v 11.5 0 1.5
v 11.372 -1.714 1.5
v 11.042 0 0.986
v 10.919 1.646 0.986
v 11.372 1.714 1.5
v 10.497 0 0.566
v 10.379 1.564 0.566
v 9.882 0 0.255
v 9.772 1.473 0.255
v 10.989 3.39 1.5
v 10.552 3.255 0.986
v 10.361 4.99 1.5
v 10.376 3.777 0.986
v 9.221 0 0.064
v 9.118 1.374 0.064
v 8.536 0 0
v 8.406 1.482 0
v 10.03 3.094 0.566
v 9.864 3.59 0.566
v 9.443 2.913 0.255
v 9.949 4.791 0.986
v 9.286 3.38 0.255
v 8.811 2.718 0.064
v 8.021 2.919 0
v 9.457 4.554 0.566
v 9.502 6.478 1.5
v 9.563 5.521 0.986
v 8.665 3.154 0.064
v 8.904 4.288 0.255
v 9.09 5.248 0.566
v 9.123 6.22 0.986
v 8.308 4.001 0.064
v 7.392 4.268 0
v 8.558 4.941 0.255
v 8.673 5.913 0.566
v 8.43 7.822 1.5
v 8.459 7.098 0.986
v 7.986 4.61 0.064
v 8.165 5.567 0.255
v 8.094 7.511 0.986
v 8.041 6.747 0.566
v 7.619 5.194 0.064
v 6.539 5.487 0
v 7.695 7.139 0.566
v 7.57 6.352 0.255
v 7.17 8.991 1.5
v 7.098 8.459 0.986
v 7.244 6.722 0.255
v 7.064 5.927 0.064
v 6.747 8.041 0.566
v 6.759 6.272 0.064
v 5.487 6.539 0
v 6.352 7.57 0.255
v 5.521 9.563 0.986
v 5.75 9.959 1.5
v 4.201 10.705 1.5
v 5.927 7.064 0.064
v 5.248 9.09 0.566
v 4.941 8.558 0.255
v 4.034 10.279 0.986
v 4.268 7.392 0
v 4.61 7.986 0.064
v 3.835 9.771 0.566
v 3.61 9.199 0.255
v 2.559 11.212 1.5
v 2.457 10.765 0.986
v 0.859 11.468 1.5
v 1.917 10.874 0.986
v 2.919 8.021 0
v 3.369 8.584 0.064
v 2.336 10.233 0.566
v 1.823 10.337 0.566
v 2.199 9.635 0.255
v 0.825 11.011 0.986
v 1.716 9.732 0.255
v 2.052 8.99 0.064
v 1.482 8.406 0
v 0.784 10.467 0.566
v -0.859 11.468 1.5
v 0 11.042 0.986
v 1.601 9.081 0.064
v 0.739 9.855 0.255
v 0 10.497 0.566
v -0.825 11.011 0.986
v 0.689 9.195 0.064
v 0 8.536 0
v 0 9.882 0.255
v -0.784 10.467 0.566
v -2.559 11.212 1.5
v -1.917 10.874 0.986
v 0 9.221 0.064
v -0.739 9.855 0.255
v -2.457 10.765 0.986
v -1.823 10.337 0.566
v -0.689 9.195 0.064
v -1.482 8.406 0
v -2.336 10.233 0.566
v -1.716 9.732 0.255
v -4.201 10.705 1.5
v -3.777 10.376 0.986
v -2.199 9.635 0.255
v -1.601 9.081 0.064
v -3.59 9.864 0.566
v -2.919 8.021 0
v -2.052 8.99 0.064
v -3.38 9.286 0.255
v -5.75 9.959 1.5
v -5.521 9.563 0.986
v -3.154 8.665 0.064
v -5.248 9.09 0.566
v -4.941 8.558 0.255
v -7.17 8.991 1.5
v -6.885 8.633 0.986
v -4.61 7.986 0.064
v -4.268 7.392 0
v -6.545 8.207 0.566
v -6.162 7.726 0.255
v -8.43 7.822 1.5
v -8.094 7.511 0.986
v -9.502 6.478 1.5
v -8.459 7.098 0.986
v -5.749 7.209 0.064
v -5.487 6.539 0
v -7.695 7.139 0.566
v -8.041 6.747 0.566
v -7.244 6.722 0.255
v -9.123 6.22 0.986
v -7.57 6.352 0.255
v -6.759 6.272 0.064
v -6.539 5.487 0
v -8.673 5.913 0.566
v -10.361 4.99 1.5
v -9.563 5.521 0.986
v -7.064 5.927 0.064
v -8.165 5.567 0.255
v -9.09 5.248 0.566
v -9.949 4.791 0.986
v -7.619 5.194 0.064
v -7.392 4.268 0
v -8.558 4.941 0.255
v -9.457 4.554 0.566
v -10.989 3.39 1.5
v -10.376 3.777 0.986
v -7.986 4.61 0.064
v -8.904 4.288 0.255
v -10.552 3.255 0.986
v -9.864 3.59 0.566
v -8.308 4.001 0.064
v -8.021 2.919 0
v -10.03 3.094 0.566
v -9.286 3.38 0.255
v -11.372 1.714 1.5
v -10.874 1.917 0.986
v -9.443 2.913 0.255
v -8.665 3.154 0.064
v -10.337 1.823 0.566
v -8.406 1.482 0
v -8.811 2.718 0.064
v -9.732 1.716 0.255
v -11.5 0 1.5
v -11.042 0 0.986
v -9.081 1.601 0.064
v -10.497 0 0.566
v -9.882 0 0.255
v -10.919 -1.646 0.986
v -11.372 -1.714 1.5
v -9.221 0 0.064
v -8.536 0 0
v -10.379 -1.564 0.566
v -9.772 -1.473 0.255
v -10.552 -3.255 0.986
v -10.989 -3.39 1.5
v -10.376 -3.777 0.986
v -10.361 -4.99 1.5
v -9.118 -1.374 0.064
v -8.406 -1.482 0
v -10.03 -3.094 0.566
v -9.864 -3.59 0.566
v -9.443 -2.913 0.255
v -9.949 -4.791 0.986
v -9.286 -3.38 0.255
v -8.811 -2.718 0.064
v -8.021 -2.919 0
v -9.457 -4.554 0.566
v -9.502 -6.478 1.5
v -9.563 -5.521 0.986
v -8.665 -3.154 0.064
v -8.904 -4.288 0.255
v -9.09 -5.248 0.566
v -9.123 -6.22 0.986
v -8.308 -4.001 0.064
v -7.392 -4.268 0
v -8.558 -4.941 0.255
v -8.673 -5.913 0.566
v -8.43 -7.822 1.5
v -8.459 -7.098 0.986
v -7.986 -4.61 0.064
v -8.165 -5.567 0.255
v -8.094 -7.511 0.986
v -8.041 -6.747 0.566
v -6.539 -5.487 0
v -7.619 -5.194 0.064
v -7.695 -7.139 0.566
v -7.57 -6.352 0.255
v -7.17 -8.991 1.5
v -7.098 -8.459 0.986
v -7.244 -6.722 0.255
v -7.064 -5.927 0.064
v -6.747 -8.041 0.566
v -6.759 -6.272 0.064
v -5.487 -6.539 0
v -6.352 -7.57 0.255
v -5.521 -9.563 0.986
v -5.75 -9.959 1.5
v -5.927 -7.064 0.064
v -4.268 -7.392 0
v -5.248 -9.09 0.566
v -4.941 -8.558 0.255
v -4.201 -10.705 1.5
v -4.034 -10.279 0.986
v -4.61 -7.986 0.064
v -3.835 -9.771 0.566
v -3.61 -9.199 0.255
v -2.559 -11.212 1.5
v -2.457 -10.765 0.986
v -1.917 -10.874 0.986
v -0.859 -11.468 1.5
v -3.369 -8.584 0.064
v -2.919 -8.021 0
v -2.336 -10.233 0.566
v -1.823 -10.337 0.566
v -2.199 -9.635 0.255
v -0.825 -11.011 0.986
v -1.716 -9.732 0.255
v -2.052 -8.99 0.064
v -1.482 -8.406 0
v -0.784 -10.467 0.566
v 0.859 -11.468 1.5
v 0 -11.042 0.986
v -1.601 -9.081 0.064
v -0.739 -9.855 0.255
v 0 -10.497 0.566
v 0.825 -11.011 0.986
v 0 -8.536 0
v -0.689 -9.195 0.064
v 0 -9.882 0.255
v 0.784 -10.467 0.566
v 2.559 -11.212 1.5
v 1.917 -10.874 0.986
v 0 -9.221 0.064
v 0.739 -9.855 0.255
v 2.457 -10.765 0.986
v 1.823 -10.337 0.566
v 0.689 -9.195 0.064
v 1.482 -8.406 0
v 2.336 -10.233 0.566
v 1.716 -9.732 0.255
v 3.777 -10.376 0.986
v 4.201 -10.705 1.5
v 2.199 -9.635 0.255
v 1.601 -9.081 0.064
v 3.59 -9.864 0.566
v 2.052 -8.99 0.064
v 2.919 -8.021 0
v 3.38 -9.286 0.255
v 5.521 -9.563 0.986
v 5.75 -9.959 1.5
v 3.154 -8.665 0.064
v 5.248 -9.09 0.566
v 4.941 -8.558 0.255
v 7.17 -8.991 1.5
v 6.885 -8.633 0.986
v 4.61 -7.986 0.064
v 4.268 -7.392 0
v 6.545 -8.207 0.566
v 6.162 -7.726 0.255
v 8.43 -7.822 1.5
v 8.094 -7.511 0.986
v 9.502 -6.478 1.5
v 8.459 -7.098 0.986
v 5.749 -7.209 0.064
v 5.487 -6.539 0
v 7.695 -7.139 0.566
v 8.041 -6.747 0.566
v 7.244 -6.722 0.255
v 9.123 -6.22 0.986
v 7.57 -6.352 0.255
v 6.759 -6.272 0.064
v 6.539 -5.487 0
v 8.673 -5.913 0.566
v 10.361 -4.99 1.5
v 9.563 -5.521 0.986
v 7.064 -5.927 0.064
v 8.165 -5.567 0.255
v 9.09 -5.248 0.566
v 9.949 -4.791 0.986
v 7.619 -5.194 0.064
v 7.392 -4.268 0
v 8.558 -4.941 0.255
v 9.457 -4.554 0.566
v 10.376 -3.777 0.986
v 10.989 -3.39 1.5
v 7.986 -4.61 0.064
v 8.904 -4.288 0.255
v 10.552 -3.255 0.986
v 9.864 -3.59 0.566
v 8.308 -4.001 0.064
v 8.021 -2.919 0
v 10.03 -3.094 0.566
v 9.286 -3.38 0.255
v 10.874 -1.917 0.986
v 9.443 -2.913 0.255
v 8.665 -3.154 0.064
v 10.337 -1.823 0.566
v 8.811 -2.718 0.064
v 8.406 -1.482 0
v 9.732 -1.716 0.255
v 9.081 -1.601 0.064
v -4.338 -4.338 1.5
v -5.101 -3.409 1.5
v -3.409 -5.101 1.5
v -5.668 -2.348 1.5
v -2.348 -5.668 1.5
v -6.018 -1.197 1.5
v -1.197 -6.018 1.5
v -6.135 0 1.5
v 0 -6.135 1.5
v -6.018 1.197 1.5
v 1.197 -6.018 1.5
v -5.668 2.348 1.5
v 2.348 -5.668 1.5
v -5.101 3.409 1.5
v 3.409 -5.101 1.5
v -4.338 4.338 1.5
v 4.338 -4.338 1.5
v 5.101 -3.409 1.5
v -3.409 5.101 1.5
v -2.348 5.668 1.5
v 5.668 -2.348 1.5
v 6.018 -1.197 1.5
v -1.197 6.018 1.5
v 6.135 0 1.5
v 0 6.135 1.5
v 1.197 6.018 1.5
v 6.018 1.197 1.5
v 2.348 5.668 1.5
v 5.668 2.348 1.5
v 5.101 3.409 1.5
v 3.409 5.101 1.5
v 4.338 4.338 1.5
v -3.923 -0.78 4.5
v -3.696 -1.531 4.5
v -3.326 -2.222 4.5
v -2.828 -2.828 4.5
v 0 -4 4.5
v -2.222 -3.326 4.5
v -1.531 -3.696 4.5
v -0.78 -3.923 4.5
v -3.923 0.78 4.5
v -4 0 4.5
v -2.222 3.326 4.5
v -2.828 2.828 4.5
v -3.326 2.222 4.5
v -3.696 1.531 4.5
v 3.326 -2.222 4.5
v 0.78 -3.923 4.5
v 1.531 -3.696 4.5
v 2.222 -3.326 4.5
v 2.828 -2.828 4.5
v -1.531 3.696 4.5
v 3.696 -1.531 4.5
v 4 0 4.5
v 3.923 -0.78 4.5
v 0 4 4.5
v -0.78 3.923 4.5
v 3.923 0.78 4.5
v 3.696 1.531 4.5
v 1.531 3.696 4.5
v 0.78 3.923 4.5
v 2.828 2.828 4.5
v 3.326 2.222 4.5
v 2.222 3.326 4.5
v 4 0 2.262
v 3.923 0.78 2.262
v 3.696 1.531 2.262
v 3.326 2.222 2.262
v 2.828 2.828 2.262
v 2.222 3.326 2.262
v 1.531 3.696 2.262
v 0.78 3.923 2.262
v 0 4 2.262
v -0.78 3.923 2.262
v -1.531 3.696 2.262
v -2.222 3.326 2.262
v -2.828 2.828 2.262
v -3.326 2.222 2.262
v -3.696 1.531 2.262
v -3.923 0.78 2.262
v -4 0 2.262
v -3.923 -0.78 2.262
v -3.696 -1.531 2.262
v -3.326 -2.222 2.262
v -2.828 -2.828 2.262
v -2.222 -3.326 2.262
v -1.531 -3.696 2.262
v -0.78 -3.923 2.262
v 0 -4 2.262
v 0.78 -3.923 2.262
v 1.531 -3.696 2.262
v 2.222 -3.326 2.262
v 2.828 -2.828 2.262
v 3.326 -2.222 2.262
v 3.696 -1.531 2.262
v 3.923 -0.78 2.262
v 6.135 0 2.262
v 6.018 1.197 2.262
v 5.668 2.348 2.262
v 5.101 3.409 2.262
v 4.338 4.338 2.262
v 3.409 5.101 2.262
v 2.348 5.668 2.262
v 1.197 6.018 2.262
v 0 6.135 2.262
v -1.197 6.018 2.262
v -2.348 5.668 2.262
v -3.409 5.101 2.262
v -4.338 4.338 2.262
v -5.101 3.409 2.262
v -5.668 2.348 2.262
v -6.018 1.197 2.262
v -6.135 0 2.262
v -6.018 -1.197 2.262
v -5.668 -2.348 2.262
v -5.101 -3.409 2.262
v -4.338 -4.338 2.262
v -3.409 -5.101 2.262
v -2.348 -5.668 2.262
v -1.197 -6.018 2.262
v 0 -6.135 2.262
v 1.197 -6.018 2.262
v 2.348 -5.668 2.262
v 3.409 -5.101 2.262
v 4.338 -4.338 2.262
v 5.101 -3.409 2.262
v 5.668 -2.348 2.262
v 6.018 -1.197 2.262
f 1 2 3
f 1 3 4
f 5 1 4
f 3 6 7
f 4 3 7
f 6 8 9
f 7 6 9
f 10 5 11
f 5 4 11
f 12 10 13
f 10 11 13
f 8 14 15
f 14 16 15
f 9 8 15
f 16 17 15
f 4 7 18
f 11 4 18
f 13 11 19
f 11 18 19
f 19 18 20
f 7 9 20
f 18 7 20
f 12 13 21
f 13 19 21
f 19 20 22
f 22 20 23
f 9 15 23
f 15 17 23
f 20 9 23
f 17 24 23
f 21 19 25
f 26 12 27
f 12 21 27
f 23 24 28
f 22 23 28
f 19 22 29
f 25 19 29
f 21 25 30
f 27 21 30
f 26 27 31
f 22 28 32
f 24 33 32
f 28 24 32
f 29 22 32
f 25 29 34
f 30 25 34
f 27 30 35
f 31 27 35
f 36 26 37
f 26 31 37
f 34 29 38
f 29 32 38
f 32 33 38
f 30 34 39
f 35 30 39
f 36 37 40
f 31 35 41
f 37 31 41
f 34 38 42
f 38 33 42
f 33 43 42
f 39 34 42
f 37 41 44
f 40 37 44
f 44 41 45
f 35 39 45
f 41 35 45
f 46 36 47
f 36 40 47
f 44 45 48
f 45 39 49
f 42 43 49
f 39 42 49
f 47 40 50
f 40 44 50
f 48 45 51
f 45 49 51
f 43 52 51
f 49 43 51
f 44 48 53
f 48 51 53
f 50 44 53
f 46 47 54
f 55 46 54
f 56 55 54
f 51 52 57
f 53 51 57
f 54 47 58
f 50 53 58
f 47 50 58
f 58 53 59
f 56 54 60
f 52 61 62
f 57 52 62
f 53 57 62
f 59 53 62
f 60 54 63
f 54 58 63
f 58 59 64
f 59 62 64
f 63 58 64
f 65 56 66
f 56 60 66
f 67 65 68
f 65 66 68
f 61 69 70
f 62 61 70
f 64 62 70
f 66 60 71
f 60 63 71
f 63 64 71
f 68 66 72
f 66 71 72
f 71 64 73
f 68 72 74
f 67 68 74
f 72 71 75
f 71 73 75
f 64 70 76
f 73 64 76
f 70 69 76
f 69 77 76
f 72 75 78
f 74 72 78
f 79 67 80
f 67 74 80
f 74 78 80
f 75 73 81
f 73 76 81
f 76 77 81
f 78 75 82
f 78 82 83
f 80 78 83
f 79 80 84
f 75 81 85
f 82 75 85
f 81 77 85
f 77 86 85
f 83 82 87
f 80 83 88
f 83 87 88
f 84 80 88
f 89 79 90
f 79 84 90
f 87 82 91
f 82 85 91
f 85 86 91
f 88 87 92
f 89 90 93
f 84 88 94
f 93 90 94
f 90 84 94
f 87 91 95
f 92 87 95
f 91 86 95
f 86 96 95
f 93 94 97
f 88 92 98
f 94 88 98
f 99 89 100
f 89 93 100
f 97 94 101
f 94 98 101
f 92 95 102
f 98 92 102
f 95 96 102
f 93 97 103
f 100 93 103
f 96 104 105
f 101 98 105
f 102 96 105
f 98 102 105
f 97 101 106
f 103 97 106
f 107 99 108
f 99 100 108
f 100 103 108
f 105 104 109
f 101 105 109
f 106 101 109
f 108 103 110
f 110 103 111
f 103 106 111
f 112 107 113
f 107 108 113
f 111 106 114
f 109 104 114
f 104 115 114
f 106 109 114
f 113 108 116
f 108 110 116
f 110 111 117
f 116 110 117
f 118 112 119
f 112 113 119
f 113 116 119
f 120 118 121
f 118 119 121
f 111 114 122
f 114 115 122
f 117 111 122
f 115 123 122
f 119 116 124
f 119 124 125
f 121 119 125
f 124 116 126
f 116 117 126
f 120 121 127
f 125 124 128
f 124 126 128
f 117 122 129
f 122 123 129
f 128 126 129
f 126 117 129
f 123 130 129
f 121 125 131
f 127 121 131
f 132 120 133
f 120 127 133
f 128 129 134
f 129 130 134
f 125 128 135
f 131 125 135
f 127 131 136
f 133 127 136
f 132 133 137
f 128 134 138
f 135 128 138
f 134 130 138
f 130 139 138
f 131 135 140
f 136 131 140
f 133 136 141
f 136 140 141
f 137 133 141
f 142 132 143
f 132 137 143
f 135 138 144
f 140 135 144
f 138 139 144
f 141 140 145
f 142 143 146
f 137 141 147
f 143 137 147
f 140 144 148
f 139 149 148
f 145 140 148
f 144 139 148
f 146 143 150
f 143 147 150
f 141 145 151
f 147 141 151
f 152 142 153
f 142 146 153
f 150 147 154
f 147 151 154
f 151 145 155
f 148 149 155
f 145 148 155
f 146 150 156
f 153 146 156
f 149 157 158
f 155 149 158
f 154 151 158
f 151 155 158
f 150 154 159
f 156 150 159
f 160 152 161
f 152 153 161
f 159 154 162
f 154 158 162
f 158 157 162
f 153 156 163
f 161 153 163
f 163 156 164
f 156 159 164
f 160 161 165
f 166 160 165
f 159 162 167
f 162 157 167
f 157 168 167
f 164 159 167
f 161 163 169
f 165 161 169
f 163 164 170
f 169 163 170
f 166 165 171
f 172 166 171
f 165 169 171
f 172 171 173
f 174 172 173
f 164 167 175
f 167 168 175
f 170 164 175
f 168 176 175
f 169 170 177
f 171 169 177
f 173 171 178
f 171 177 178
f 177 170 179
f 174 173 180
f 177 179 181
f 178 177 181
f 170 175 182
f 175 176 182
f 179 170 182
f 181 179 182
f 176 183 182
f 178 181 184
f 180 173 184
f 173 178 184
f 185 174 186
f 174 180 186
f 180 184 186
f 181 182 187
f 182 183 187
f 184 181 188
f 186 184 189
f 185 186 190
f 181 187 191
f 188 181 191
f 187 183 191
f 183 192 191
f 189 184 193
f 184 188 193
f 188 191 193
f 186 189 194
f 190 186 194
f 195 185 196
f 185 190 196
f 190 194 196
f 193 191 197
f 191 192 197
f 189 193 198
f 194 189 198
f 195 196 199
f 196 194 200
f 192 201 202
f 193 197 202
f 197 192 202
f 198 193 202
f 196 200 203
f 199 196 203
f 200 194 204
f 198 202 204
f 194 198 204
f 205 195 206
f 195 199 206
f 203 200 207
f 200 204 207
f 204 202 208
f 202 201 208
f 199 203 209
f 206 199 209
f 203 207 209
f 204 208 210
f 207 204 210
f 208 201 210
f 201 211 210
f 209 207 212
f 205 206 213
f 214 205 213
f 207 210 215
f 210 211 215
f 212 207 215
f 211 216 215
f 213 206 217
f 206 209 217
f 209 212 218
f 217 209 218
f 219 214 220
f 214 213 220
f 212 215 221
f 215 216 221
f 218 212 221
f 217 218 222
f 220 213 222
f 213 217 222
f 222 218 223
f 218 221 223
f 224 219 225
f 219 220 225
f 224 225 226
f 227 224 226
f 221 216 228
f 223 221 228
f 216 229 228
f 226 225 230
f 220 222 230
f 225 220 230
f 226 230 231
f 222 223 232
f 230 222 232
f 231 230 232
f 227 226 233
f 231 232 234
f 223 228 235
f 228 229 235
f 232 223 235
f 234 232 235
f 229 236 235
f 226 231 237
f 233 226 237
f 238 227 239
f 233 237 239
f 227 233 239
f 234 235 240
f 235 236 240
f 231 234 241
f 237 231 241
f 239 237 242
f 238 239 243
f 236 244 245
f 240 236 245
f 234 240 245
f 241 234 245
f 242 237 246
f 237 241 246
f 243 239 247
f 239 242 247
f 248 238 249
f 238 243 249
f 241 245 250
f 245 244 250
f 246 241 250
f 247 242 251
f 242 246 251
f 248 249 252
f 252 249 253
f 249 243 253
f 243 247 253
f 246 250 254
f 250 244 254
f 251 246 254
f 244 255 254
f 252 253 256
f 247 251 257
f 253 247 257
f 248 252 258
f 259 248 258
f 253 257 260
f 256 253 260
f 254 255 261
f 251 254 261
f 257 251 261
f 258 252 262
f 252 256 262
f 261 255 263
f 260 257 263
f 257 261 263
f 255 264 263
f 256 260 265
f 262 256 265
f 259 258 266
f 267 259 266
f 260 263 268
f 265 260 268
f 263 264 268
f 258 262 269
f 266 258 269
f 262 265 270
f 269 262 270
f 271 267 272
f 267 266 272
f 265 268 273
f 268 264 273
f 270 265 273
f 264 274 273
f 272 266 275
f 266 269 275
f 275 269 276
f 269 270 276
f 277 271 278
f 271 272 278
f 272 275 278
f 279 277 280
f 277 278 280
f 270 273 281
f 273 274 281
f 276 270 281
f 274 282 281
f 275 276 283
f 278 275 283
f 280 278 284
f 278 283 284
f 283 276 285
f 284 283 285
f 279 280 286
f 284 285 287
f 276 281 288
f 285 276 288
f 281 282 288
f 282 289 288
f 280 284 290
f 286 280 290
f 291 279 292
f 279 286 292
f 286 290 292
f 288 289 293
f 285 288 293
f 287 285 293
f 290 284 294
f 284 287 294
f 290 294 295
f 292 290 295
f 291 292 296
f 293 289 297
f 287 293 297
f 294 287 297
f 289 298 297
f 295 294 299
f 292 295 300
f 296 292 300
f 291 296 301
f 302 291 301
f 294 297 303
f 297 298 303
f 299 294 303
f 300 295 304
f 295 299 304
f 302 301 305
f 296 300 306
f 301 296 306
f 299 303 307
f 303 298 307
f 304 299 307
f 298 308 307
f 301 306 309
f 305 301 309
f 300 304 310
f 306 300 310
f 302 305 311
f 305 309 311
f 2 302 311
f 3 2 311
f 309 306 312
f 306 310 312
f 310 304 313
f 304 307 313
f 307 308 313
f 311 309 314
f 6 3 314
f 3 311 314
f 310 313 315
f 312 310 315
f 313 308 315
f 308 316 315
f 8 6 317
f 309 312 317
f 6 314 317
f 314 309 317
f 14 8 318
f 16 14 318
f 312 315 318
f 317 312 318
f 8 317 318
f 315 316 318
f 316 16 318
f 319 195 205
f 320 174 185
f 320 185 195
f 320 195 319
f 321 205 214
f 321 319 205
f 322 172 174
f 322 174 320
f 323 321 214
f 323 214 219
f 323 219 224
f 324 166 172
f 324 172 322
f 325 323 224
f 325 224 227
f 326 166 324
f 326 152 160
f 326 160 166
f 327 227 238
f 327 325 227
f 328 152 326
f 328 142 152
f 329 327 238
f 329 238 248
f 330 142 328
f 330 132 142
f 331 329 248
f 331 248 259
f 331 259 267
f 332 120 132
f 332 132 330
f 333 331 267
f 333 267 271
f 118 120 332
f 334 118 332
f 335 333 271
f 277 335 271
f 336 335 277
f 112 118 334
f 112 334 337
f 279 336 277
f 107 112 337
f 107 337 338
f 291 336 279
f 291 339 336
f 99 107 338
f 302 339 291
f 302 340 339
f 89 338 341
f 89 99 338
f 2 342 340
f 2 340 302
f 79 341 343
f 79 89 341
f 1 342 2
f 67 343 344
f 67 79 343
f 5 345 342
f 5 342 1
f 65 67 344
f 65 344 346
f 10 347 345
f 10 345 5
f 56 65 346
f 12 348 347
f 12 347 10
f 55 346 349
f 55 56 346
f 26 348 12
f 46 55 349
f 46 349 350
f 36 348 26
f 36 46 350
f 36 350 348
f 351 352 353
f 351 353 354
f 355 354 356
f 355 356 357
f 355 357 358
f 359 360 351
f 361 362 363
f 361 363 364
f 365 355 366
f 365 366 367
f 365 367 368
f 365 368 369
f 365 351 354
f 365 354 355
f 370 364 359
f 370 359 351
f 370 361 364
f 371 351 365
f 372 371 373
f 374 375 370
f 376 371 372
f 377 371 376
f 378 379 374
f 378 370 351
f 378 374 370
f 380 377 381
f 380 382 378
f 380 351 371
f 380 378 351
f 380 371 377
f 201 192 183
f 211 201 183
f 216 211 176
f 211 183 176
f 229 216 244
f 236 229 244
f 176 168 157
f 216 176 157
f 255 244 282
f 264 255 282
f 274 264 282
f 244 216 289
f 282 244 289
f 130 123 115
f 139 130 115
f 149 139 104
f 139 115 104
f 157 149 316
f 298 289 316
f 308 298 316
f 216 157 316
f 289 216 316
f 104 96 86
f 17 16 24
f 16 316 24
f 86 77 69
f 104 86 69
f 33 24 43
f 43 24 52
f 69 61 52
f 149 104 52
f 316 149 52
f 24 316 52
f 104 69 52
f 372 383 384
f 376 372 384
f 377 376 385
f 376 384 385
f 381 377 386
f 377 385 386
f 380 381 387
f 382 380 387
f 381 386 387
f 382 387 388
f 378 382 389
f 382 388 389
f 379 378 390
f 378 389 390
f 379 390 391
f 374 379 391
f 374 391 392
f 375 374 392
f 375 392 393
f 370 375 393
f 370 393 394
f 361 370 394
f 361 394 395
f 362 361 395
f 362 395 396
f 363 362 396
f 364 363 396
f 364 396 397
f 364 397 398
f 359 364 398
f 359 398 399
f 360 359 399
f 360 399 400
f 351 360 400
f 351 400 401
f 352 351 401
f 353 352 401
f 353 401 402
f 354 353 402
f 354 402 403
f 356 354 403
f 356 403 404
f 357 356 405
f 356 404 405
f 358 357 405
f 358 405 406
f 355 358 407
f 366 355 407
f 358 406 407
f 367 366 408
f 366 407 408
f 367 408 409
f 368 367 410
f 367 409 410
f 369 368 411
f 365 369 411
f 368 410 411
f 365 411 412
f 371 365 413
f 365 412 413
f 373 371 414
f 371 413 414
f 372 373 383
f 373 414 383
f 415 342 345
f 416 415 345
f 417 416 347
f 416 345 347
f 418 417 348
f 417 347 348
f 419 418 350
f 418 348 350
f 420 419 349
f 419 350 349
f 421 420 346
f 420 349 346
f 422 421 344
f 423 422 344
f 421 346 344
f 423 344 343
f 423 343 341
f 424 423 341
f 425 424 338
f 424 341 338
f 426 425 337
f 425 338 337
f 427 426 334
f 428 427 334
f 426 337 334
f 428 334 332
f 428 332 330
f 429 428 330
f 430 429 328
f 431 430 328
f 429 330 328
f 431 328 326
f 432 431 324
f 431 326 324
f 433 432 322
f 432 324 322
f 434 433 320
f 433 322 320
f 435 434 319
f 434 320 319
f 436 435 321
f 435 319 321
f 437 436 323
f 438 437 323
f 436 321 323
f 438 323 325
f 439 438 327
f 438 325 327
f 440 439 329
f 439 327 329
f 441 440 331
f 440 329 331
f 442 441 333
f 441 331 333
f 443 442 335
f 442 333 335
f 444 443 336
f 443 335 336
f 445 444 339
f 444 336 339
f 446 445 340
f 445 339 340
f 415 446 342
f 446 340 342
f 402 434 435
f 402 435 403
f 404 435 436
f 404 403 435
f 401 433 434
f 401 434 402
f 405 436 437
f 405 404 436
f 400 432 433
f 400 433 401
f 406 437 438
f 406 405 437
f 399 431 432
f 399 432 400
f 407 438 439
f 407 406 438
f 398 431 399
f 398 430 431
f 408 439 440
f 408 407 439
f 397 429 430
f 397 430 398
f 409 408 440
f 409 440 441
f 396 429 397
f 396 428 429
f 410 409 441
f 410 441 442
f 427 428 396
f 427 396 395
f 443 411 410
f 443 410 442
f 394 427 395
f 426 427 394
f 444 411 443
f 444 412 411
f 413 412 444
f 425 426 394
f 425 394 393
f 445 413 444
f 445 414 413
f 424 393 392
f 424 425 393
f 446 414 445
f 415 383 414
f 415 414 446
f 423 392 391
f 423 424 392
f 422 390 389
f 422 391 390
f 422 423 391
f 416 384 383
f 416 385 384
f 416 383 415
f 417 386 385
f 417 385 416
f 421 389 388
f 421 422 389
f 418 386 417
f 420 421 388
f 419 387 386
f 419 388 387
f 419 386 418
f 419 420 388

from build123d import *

# Parameters (mm, degrees)
F0_R     = 11.5
F1_DEPTH = 1.5
F3_R     = 6.1353913868
F3_R_2   = 4
F4_DEPTH = 0.762
F2_R     = 4
F5_DEPTH = 3


# Not quite as in the source:
# - a fillet or chamfer that OpenCascade refuses, or shapes differently, is made with other operations: its cross-section is extruded or revolved along the edge and cut away or added


with BuildPart() as f1:
    # F0 (on Top) → F1 (new body)
    with BuildSketch(Plane.XY):
        Circle(F0_R)
    extrude(amount=F1_DEPTH)

    # F3 (on face) → F4 (join)
    with BuildSketch(Plane.XY.offset(1.5)):
        Circle(F3_R)
        Circle(F3_R_2, mode=Mode.SUBTRACT)
    extrude(amount=F4_DEPTH)

    # F2 (on face) → F5 (join)
    with BuildSketch(Plane.XY.offset(1.5)):
        Circle(F2_R)
    extrude(amount=F5_DEPTH)

    # F6: fillet of radius 3.6792614691 on 1 edges, made by hand

    # F6_s1 → F6_t2 (revolve, cut)
    with BuildSketch(Plane.XZ):
        with BuildLine():
            ThreePointArc((11.5, 1.5), (10.1967383184, 0.396348303), (8.5355802579, 0))
            Line((8.5355802579, 0), (11.5, 0))
            Line((11.5, 0), (11.5, 1.5))
        make_face()
    revolve(axis=Axis((0, 0, 0), (0, 0, 1)), mode=Mode.SUBTRACT)


solid = f1.part
